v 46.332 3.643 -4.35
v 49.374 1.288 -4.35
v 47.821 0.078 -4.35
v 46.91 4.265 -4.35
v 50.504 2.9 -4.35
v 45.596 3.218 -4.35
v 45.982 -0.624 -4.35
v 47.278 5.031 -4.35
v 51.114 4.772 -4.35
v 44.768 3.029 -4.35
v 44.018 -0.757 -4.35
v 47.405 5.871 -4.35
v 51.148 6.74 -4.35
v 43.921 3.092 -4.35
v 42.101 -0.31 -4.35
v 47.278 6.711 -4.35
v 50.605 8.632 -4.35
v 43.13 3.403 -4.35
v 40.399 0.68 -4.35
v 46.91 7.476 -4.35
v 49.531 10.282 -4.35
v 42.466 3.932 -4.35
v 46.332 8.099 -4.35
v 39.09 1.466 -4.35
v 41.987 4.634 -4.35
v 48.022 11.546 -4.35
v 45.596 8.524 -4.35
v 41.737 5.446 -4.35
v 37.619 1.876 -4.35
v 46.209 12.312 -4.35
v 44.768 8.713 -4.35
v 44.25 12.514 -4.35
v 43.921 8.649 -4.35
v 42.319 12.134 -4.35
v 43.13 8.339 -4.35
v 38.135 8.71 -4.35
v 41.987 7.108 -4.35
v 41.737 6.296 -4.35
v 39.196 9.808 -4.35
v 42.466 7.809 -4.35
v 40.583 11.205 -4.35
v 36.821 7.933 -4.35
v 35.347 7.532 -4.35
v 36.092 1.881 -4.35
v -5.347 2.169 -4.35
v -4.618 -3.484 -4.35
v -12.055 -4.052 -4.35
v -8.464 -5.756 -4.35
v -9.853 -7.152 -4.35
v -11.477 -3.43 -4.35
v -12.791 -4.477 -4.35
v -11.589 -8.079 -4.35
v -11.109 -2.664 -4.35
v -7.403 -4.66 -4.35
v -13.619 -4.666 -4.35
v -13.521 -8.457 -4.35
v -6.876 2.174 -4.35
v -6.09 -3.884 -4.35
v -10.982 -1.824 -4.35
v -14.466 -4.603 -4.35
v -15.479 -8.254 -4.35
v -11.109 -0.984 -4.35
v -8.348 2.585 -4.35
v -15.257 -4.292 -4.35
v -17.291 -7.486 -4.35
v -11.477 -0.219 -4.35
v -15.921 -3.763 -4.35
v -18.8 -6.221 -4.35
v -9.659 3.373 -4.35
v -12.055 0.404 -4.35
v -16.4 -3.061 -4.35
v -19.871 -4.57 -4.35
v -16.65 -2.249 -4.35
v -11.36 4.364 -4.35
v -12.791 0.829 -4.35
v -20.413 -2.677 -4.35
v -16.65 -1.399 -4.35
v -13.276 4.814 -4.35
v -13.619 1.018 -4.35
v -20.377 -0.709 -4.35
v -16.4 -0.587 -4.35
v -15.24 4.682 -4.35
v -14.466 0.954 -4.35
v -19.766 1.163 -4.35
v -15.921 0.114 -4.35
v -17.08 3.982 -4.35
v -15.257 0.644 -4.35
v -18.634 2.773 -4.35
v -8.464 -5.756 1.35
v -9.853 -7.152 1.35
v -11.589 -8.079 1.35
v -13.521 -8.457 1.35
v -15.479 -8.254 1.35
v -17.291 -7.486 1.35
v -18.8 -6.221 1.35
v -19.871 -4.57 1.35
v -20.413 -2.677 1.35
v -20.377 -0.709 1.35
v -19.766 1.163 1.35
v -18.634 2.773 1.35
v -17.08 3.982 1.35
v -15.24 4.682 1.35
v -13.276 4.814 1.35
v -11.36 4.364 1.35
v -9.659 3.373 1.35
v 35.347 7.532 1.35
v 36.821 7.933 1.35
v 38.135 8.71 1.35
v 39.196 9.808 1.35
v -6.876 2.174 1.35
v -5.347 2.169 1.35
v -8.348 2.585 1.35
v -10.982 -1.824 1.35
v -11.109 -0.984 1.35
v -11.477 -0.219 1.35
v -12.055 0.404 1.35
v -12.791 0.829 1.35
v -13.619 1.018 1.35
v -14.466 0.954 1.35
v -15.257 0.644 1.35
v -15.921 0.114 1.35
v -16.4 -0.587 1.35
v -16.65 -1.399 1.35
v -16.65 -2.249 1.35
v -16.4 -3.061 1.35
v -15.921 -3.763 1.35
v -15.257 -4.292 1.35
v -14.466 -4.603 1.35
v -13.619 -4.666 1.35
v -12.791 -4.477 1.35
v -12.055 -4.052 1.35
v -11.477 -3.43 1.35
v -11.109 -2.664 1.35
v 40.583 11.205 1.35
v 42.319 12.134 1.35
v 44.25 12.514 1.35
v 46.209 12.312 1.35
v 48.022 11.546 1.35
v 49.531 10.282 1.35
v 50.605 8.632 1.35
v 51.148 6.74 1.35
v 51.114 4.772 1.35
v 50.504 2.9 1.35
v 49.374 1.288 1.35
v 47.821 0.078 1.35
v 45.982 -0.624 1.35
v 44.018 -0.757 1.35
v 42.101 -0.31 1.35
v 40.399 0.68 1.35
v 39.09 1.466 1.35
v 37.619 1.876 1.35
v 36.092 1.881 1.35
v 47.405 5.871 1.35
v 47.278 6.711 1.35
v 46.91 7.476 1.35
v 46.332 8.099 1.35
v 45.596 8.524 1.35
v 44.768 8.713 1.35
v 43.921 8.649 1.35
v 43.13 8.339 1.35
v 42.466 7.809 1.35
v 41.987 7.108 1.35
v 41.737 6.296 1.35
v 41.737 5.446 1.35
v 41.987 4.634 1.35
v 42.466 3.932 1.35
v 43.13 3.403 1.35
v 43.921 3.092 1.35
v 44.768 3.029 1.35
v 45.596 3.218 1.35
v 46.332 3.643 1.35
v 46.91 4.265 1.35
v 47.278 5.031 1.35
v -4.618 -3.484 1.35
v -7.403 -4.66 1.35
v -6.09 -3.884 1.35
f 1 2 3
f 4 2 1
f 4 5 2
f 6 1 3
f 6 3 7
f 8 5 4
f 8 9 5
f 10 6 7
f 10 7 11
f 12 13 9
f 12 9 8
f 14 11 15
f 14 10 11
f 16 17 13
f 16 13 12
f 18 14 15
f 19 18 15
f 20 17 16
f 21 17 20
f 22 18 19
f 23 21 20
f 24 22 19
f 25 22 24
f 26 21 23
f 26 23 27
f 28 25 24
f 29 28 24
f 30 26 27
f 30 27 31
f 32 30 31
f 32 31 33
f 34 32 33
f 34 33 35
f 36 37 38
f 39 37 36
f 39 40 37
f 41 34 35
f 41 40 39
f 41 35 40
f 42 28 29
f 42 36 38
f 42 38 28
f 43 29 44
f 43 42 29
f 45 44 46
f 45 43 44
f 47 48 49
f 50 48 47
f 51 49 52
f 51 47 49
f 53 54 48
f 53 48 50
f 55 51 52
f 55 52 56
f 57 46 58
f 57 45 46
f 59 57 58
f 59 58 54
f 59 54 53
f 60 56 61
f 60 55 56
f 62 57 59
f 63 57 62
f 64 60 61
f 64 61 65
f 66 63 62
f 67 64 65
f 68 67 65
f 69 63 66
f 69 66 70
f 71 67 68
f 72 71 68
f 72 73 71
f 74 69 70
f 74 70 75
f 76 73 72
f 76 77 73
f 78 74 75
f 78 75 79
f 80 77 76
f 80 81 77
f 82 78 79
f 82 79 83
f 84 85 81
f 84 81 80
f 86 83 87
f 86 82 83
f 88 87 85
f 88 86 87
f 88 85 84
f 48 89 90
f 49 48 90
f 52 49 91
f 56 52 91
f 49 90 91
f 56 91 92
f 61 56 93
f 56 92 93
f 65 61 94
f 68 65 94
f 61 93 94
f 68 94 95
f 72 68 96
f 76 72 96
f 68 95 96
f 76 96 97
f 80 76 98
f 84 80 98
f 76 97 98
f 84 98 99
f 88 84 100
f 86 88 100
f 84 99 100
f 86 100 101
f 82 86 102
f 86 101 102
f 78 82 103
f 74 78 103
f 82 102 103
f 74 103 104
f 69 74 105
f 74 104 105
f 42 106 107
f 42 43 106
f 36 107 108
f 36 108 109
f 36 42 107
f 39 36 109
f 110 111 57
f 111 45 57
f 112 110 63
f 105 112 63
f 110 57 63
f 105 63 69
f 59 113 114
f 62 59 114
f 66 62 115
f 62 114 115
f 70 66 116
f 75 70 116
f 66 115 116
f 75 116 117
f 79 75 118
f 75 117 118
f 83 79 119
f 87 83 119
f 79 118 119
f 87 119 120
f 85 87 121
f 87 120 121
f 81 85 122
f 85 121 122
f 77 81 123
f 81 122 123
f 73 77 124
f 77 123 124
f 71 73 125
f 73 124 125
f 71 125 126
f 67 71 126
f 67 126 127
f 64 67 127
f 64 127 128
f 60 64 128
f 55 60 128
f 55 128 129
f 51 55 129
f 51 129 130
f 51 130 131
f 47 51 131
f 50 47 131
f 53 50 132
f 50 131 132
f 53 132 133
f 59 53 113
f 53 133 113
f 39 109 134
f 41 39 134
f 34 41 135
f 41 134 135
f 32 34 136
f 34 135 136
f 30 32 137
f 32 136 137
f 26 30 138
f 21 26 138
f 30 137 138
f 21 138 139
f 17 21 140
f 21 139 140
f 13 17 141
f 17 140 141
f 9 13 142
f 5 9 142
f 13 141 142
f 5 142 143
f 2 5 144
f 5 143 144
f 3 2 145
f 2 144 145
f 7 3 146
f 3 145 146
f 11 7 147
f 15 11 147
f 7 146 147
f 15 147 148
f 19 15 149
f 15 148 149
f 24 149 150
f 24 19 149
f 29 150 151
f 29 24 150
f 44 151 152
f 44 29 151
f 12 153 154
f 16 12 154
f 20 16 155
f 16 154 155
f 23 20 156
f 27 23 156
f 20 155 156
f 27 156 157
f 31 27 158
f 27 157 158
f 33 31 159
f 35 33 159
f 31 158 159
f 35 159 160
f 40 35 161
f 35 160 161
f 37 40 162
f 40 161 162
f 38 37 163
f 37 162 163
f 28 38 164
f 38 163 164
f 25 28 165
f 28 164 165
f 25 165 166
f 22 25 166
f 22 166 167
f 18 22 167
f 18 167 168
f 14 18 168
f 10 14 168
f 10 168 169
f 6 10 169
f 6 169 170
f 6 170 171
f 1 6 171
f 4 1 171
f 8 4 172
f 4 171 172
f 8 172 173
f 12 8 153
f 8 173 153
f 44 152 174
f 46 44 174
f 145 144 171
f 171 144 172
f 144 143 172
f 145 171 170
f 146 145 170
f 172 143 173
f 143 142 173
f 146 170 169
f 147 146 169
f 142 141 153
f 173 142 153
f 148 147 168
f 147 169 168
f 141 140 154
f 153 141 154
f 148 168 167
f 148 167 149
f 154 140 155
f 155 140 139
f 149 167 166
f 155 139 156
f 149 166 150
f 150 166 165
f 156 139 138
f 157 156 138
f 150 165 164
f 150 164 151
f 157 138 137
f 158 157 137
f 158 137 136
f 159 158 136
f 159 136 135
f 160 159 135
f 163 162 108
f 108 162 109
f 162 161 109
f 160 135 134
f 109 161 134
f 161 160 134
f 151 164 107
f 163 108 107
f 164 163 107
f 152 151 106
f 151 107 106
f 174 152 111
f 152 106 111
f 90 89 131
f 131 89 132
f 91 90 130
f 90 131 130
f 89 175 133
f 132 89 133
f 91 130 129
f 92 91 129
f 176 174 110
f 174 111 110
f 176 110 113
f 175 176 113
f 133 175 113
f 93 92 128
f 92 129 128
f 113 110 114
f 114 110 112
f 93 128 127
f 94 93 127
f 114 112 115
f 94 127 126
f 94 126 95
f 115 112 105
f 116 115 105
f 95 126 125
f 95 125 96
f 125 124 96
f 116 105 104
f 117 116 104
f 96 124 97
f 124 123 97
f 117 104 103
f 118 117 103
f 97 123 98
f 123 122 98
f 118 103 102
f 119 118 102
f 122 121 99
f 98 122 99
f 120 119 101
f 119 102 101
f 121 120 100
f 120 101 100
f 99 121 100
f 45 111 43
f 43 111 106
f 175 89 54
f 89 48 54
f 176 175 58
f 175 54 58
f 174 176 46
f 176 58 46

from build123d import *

# Parameters (mm, degrees)
SKETCH1_R           = 1.5
BOSS_EXTRUDE1_DEPTH = 3
FILLET1_R           = 3
SCALE1_SCALE        = 1.9


with BuildPart() as part:
    # Sketch1 → Boss-Extrude1 (new body)
    with BuildSketch(Plane.XY):
        with BuildLine():
            Line((2.948464825, 1.901558102), (27.398838387, 5.123947068))
            ThreePointArc((27.398838387, 5.123947068), (34.199993873, 4.507321028), (27.790827839, 2.149666606))
            Line((27.790827839, 2.149666606), (3.336427979, -1.073252998))
            ThreePointArc((3.336427979, -1.073252998), (-3.463886078, -0.447419324), (2.948464825, 1.901558102))
        make_face()
        Circle(SKETCH1_R, mode=Mode.SUBTRACT)
        with Locations((30.73, 4.05)):
            Circle(SKETCH1_R, mode=Mode.SUBTRACT)
    extrude(amount=-BOSS_EXTRUDE1_DEPTH)

    # Fillet1
    fillet1_edges = [part.edges().sort_by_distance(p)[0] for p in [
        (3.336427979, -1.073252998, -1.5),
        (2.948464825, 1.901558102, -1.5),
        (27.398838387, 5.123947068, -1.5),
        (27.790827839, 2.149666606, -1.5),
    ]]
    fillet(fillet1_edges, radius=FILLET1_R)


with BuildPart() as part_1:
    # Scale1: scaled about (15.368858916, 2.026731994, -1.5)
    add(part.part.scale(SCALE1_SCALE).moved(Location((-13.831973024, -1.824058795, 1.35))))


solid = part_1.part
